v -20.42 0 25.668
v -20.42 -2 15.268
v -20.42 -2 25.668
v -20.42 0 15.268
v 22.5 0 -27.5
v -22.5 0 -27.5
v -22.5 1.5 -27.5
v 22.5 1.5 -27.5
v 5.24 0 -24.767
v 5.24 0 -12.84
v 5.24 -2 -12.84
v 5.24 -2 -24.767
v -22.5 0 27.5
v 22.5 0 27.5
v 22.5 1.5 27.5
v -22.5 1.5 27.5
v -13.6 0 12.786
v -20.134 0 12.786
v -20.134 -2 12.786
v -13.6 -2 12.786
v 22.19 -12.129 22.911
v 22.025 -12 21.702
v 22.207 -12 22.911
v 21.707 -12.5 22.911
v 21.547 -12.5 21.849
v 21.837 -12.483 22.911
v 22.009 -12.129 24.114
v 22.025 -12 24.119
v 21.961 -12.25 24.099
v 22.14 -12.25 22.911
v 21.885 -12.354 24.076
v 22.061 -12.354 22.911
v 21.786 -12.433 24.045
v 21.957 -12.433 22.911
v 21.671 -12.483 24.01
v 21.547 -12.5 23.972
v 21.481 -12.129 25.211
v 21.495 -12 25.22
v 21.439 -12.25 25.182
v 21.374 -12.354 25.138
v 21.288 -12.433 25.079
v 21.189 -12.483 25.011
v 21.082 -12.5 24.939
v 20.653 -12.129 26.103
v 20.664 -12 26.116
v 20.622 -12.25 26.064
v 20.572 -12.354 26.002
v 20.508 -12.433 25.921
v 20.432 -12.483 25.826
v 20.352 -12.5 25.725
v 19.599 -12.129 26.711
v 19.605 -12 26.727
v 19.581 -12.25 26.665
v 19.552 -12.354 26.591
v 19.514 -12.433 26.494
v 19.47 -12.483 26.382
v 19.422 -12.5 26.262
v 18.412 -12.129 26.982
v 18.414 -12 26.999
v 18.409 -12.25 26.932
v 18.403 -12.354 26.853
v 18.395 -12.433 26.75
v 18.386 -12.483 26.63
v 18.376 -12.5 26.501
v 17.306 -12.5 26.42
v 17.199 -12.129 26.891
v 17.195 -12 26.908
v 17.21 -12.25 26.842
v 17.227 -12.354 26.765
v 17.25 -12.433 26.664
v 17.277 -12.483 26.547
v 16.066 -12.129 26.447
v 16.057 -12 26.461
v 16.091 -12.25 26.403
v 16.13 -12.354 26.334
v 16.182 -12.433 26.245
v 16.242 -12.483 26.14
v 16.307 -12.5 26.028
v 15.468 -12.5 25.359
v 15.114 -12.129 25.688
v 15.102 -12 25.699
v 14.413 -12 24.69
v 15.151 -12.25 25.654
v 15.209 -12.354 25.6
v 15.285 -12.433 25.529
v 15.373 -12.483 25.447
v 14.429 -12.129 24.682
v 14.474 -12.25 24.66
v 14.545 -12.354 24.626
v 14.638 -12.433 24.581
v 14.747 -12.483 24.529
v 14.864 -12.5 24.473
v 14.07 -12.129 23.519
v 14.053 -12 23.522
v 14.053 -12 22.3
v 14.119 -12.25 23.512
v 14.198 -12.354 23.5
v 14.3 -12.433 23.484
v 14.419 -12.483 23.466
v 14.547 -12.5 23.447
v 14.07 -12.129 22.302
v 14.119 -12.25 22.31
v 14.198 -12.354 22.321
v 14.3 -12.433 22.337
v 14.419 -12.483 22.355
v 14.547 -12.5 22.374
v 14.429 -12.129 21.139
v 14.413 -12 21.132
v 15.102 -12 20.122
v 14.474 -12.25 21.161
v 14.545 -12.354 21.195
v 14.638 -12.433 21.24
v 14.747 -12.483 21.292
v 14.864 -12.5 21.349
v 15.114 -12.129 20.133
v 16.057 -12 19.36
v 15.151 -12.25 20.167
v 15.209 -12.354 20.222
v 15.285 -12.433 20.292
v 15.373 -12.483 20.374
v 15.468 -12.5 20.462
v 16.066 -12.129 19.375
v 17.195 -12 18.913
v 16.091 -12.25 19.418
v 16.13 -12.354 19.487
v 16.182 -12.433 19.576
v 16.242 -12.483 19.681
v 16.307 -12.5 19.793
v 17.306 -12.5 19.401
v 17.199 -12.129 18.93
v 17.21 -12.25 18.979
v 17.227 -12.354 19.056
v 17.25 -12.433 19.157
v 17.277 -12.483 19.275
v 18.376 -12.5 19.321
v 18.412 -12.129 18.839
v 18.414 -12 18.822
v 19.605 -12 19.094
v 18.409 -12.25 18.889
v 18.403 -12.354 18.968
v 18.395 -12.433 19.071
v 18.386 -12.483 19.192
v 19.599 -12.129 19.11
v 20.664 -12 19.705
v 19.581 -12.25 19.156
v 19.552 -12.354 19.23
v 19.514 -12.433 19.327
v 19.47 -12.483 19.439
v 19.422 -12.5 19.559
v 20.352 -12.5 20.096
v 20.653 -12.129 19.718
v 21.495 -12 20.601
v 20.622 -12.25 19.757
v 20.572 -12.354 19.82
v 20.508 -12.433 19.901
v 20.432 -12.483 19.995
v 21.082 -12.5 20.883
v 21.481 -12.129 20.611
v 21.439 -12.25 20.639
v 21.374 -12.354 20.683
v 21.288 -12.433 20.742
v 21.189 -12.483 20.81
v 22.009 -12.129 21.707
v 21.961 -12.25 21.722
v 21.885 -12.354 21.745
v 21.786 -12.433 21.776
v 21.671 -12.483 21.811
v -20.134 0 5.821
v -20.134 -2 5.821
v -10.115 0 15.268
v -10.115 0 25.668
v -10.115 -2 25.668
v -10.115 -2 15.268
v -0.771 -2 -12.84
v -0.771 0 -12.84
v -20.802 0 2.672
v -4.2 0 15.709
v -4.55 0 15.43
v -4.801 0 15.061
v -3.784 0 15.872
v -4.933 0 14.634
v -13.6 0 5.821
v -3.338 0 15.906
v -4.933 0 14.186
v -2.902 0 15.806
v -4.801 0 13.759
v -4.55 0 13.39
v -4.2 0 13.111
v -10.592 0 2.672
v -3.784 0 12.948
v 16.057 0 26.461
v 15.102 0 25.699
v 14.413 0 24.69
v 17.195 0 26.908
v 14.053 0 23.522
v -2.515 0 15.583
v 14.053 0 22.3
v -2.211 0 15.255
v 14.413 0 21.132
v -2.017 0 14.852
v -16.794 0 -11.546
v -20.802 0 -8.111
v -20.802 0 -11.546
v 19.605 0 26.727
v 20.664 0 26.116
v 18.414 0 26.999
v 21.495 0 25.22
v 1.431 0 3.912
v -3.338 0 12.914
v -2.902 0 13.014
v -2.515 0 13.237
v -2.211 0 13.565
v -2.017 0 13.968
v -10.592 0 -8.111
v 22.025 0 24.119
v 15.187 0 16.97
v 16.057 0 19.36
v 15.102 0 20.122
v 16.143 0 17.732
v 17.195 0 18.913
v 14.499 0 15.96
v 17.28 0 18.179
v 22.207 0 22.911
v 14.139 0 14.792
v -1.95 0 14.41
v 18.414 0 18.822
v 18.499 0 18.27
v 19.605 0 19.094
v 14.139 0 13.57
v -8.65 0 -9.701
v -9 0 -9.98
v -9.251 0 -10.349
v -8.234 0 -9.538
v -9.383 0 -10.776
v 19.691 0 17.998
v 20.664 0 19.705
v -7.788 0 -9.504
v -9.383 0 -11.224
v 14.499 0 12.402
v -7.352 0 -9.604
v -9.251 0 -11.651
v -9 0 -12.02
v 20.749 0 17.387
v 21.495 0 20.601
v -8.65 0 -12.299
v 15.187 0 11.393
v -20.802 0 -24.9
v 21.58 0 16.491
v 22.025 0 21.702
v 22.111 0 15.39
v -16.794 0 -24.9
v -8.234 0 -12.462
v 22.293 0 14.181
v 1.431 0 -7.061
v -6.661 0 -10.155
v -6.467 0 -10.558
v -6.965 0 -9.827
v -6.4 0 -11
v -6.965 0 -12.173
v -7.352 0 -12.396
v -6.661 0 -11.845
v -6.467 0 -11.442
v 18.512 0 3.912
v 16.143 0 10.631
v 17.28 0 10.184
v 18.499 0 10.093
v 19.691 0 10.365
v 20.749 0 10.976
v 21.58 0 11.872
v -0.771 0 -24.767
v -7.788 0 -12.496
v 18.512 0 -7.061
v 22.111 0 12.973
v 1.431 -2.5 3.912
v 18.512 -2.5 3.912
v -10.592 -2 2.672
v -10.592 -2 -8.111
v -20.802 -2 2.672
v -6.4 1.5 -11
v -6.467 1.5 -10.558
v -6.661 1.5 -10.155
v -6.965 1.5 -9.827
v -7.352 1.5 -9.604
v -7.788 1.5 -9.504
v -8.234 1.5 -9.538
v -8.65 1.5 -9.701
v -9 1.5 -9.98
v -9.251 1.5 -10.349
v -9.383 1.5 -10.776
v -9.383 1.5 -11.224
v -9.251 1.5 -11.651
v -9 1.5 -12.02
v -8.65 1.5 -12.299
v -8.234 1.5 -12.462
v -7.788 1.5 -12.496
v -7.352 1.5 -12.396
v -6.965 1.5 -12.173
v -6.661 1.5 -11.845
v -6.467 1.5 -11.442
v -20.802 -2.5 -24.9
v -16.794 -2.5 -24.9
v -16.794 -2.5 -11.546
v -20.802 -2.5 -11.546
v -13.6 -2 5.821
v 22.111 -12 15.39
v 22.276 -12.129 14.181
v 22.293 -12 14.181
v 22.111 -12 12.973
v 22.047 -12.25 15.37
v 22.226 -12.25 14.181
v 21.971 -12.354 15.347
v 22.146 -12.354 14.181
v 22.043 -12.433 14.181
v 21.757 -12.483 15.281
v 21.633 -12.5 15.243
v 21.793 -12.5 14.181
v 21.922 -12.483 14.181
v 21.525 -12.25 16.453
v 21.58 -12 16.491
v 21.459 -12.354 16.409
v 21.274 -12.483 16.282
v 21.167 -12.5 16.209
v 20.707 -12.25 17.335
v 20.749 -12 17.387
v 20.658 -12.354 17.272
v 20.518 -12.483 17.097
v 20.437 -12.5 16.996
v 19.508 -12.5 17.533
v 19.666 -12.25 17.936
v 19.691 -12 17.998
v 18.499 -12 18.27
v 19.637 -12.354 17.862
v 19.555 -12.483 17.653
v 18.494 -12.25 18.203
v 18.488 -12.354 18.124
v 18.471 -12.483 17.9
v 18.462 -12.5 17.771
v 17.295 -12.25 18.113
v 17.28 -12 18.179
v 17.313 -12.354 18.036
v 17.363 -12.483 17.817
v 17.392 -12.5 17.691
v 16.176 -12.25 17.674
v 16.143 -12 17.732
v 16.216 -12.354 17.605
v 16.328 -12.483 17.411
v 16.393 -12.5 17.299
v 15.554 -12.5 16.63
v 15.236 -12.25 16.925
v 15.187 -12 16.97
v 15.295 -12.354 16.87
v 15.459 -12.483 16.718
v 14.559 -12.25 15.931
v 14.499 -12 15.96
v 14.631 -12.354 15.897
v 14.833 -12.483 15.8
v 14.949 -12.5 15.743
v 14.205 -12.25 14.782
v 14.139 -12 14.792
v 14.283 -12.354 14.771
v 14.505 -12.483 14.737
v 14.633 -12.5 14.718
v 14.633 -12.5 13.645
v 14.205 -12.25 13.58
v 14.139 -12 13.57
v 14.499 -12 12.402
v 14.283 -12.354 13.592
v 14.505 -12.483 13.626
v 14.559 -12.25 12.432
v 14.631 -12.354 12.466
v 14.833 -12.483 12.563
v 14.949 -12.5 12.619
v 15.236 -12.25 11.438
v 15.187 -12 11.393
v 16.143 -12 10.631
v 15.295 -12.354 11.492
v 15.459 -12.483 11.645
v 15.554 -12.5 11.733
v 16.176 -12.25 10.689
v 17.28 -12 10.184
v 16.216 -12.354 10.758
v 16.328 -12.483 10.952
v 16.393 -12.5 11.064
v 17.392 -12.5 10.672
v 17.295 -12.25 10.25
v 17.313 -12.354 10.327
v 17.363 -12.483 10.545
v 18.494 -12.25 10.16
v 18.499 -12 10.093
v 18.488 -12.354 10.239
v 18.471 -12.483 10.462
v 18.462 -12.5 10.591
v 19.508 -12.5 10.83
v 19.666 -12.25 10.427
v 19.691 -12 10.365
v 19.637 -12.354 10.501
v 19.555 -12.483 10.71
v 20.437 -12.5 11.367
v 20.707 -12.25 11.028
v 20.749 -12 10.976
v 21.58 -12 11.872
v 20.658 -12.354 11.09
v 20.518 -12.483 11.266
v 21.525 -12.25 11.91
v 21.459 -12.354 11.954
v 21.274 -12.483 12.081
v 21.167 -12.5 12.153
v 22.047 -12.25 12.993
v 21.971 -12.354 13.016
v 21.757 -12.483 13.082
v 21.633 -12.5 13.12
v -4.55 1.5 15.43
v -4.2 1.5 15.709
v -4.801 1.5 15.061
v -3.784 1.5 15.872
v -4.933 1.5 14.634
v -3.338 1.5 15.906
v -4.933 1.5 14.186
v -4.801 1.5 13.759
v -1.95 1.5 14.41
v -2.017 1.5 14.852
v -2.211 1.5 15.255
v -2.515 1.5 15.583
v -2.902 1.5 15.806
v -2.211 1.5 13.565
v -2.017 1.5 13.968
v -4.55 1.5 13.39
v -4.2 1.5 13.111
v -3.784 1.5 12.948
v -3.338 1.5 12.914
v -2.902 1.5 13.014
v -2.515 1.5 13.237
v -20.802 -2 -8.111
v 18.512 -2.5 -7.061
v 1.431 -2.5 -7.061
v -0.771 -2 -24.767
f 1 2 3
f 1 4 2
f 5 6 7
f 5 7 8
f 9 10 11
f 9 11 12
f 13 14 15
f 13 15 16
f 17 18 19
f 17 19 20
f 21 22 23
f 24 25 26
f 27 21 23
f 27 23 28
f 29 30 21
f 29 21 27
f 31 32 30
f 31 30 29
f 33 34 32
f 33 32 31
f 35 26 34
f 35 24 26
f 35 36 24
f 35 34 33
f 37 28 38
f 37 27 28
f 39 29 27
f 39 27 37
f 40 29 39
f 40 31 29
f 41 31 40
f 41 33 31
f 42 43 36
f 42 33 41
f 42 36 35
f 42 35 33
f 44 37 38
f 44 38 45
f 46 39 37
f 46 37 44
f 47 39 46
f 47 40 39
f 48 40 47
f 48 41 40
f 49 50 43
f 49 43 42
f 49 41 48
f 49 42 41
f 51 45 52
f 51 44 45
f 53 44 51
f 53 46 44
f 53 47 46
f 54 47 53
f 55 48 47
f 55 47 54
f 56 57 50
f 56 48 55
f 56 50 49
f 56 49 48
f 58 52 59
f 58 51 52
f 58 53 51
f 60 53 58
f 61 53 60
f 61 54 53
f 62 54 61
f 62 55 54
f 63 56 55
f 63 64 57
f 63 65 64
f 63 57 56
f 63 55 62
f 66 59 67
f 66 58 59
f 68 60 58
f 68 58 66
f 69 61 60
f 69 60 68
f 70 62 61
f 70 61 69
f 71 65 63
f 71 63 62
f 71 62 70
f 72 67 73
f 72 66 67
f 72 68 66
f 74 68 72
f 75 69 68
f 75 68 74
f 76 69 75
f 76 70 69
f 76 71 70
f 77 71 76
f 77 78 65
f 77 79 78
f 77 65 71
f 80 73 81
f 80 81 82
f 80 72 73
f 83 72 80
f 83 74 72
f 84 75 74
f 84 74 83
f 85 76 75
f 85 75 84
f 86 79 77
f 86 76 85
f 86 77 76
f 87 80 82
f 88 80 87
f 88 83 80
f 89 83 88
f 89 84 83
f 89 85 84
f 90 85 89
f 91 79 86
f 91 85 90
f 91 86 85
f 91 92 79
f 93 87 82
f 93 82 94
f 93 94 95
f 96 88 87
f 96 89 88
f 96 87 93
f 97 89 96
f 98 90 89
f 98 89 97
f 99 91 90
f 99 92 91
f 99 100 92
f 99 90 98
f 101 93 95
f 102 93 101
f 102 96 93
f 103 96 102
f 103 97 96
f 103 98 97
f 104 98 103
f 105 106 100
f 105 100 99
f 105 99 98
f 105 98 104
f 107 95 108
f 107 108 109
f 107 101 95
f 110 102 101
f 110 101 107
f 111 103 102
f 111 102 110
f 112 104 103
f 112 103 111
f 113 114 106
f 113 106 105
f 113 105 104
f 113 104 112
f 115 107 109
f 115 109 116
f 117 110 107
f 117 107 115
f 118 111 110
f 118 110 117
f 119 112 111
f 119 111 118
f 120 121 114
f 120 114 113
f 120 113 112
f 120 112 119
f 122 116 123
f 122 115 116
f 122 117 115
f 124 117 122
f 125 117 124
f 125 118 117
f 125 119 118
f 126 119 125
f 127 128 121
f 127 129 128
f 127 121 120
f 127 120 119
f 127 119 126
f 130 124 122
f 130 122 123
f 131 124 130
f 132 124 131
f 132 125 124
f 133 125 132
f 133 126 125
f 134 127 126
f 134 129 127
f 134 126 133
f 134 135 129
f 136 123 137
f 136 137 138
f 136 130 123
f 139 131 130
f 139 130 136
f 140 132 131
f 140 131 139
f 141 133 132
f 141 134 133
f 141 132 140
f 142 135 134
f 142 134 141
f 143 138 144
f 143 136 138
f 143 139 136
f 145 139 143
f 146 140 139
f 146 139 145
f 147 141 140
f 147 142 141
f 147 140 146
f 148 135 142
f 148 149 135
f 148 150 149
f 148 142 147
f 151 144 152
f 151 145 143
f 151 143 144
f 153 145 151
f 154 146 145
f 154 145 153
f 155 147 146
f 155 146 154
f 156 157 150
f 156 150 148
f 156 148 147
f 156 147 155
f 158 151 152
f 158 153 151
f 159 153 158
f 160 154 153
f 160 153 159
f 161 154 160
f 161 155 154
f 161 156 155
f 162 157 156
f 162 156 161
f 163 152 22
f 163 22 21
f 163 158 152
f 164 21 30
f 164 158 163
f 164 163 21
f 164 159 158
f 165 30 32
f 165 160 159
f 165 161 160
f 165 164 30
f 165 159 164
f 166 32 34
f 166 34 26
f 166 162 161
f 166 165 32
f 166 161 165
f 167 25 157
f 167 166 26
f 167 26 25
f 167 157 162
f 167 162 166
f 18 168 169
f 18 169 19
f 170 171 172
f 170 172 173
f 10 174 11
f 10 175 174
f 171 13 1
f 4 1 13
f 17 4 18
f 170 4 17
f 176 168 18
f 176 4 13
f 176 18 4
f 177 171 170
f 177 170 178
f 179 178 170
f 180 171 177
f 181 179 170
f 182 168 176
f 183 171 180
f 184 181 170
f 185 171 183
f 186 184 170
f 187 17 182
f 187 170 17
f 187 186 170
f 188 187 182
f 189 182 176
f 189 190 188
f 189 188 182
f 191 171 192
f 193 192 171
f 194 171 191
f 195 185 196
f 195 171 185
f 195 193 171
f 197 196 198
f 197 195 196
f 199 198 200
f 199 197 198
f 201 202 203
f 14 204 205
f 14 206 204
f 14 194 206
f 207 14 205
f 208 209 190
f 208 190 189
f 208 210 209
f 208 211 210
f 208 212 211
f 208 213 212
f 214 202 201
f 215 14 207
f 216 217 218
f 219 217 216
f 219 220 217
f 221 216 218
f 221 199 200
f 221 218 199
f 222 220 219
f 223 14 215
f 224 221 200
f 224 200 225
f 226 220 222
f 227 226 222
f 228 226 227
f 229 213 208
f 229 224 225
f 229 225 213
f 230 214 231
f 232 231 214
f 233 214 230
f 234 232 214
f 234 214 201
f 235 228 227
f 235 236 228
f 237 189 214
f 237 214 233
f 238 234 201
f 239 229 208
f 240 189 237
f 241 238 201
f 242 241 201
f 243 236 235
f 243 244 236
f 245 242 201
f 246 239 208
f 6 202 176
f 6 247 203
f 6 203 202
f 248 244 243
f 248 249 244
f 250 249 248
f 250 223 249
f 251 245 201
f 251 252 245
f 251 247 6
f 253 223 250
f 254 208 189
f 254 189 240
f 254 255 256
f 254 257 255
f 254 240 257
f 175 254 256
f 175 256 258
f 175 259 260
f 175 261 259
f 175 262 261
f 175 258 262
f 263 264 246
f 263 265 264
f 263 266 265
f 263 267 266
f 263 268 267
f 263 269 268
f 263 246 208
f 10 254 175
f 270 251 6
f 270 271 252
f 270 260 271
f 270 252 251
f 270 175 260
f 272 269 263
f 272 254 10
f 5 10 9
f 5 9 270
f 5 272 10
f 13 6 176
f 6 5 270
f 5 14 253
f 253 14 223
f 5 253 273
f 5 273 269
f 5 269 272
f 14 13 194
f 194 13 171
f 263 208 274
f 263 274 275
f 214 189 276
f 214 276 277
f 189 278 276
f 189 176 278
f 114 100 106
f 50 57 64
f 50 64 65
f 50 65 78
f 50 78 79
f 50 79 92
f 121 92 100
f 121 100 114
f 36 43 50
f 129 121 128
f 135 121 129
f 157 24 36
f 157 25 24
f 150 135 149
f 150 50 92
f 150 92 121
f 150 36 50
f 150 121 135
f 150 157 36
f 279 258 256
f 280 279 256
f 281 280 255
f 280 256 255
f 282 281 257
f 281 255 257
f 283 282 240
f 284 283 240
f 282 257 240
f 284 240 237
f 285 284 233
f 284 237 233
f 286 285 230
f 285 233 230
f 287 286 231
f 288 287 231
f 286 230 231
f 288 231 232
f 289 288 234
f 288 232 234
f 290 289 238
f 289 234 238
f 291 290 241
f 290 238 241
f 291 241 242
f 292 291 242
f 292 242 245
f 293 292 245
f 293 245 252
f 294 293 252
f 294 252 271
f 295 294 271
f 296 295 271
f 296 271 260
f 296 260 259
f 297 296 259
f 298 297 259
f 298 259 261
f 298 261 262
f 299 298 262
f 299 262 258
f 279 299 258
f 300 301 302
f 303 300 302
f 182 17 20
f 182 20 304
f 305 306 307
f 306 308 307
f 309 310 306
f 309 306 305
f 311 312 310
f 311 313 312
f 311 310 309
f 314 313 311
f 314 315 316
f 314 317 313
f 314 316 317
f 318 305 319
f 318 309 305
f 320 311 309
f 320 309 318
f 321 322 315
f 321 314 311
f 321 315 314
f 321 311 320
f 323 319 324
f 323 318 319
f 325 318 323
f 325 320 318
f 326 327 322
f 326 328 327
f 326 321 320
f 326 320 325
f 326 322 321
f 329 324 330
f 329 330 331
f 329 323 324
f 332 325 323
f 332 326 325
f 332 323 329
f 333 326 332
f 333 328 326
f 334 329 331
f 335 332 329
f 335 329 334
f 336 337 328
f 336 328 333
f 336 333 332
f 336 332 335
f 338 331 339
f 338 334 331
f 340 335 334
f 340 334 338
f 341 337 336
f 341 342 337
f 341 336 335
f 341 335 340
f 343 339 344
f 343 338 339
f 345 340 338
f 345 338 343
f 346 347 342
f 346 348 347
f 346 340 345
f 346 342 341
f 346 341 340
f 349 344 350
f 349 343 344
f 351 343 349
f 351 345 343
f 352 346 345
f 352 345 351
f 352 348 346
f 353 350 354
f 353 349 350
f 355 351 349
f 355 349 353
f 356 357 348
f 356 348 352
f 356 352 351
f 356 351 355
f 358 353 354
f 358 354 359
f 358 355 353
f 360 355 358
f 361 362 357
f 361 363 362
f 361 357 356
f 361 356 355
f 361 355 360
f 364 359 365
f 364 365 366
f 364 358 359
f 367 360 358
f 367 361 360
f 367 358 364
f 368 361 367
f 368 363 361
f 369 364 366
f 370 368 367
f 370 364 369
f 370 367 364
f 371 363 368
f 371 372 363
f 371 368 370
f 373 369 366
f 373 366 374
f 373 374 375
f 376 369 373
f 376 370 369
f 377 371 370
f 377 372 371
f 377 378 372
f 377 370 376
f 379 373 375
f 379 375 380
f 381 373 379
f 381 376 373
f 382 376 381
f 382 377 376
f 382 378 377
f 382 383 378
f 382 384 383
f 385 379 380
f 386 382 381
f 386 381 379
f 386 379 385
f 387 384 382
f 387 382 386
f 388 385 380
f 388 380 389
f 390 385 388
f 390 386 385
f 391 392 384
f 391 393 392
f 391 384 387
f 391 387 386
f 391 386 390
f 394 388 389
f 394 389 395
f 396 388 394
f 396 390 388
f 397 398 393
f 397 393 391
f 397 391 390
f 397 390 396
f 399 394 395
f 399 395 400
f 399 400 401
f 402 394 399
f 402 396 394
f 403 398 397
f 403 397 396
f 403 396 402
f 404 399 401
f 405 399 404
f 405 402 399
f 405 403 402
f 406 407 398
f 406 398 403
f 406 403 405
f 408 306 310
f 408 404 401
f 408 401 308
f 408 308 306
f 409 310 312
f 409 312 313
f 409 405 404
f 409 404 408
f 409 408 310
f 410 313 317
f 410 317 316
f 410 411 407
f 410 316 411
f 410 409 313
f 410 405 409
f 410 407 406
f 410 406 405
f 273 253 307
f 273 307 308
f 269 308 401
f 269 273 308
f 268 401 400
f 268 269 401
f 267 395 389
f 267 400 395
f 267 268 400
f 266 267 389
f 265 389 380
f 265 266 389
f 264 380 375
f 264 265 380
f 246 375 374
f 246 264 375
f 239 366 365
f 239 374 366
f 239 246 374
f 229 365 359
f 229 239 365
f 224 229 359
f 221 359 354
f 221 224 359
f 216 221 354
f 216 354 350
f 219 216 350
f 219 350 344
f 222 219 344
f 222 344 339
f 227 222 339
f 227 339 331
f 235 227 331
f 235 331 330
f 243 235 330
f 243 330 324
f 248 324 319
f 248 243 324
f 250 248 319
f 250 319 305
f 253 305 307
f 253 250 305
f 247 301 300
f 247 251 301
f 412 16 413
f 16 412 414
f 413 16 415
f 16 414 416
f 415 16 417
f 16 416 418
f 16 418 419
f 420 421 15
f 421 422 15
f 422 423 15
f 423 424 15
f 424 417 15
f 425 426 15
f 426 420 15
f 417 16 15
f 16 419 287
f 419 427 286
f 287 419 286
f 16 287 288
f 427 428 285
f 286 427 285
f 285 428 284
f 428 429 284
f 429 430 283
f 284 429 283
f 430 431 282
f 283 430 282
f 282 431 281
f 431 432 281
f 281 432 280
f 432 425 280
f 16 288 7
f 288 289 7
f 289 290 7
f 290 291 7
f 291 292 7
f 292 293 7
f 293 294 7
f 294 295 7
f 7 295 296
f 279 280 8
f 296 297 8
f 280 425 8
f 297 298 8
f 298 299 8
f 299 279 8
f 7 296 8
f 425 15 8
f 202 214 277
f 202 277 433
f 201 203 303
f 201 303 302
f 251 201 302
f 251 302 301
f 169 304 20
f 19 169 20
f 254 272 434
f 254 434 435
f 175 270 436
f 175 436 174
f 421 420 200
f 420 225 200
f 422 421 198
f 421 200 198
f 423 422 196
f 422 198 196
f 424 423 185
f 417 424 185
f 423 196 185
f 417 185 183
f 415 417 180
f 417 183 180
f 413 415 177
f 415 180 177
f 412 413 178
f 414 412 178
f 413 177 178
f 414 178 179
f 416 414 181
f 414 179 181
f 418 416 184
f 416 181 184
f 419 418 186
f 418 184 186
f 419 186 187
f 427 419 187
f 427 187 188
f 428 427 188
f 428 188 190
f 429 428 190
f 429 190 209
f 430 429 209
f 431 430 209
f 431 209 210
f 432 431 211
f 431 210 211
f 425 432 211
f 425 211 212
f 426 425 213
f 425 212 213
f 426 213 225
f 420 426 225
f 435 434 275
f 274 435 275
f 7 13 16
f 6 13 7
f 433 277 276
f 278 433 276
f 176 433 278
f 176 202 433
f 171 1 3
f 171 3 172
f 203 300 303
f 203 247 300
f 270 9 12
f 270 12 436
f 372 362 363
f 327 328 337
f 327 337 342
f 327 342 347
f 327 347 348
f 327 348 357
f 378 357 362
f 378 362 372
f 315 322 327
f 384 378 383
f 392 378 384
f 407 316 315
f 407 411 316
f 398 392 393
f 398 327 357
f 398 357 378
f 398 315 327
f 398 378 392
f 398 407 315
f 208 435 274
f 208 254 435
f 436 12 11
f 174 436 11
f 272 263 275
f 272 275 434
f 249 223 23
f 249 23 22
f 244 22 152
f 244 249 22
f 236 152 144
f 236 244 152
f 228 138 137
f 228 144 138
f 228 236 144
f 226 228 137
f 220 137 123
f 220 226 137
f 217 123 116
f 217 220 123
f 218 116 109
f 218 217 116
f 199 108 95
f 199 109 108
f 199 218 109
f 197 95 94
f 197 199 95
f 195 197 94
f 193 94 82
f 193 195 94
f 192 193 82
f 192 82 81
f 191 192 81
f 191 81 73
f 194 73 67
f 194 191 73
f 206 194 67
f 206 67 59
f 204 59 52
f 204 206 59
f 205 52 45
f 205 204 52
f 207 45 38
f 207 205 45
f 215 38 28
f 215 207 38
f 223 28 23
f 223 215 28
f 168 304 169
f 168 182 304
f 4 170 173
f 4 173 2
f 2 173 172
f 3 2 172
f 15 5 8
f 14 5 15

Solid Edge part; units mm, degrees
sketch "Sketch1" plane through (0, 0, 0) normal (0, -1, 0) x (1, 0, 0)
  line L0 (22.5, -27.5) -> (22.5, 27.5)
  line L1 (22.5, 27.5) -> (-22.5, 27.5)
  line L2 (-22.5, 27.5) -> (-22.5, -27.5)
  line L3 (-22.5, -27.5) -> (22.5, -27.5)
extrude "Protrusion1" add sketch "Sketch1" against normal blind 1.5
sketch "Sketch2" plane through (0, 0, 0) normal (0, -1, 0) x (1, 0, 0)
  circle A0 centre (-3.45, 14.41) radius 1.5
  circle A1 centre (-7.9, -11) radius 1.5
extrude "ExtrudedCutout_1" cut sketch "Sketch2" against normal blind 1.7648
sketch "Sketch3" plane through (0, 0, 0) normal (0, -1, 0) x (1, 0, 0)
  line L0 (-10.1147, 15.2675) -> (-20.4202, 15.2675)
  line L1 (-20.4202, 15.2675) -> (-20.4202, 25.6684)
  line L2 (-20.4202, 25.6684) -> (-10.1147, 25.6684)
  line L3 (-10.1147, 25.6684) -> (-10.1147, 15.2675)
  line L4 (-13.6, 5.8207) -> (-20.134, 5.8207)
  line L5 (-20.134, 5.8207) -> (-20.134, 12.7865)
  line L6 (-20.134, 12.7865) -> (-13.6, 12.7865)
  line L7 (-13.6, 12.7865) -> (-13.6, 5.8207)
  line L8 (-20.8019, 2.6718) -> (-10.5918, 2.6718)
  line L9 (-10.5918, 2.6718) -> (-10.5918, -8.1108)
  line L10 (-10.5918, -8.1108) -> (-20.8019, -8.1108)
  line L11 (-20.8019, -8.1108) -> (-20.8019, 2.6718)
extrude "ExtrudedProtrusion_2" add sketch "Sketch3" along normal blind 2
sketch "Sketch4" plane through (0, 0, 0) normal (0, -1, 0) x (1, 0, 0)
  line L0 (-16.7942, -24.9) -> (-20.8019, -24.9)
  line L1 (-20.8019, -24.9) -> (-20.8019, -11.546)
  line L2 (-20.8019, -11.546) -> (-16.7942, -11.546)
  line L3 (-16.7942, -11.546) -> (-16.7942, -24.9)
extrude "ExtrudedProtrusion_3" add sketch "Sketch4" along normal blind 2.5
sketch "Sketch5" plane through (0, 0, 0) normal (0, -1, 0) x (1, 0, 0)
  line L0 (-0.7713, -24.7674) -> (-0.7713, -12.8397)
  line L1 (-0.7713, -12.8397) -> (5.2403, -12.8397)
  line L2 (5.2403, -12.8397) -> (5.2403, -24.7674)
  line L3 (5.2403, -24.7674) -> (-0.7713, -24.7674)
extrude "ExtrudedProtrusion_6" add sketch "Sketch5" along normal blind 2
sketch "Sketch6" plane through (0, 0, 0) normal (0, -1, 0) x (1, 0, 0)
  line L0 (18.5118, -7.0612) -> (1.4313, -7.0612)
  line L1 (1.4313, -7.0612) -> (1.4313, 3.9123)
  line L2 (1.4313, 3.9123) -> (18.5118, 3.9123)
  line L3 (18.5118, 3.9123) -> (18.5118, -7.0612)
extrude "ExtrudedProtrusion_7" add sketch "Sketch6" along normal blind 2.5
sketch "Sketch7" plane through (0, 0, 0) normal (0, -1, 0) x (1, 0, 0)
  circle A0 centre (18.1072, 22.9106) radius 4.1
extrude "ExtrudedProtrusion_8" add sketch "Sketch7" along normal blind 12.5
sketch "Sketch8" plane through (0, 0, 0) normal (0, -1, 0) x (1, 0, 0)
  circle A0 centre (18.1928, 14.1814) radius 4.1
extrude "ExtrudedProtrusion_9" add sketch "Sketch8" along normal blind 12.5
fillet "Round_1" radius 0.5 2 edges at (14.0928, -12.5, 14.1814) (14.0072, -12.5, 22.9106)
